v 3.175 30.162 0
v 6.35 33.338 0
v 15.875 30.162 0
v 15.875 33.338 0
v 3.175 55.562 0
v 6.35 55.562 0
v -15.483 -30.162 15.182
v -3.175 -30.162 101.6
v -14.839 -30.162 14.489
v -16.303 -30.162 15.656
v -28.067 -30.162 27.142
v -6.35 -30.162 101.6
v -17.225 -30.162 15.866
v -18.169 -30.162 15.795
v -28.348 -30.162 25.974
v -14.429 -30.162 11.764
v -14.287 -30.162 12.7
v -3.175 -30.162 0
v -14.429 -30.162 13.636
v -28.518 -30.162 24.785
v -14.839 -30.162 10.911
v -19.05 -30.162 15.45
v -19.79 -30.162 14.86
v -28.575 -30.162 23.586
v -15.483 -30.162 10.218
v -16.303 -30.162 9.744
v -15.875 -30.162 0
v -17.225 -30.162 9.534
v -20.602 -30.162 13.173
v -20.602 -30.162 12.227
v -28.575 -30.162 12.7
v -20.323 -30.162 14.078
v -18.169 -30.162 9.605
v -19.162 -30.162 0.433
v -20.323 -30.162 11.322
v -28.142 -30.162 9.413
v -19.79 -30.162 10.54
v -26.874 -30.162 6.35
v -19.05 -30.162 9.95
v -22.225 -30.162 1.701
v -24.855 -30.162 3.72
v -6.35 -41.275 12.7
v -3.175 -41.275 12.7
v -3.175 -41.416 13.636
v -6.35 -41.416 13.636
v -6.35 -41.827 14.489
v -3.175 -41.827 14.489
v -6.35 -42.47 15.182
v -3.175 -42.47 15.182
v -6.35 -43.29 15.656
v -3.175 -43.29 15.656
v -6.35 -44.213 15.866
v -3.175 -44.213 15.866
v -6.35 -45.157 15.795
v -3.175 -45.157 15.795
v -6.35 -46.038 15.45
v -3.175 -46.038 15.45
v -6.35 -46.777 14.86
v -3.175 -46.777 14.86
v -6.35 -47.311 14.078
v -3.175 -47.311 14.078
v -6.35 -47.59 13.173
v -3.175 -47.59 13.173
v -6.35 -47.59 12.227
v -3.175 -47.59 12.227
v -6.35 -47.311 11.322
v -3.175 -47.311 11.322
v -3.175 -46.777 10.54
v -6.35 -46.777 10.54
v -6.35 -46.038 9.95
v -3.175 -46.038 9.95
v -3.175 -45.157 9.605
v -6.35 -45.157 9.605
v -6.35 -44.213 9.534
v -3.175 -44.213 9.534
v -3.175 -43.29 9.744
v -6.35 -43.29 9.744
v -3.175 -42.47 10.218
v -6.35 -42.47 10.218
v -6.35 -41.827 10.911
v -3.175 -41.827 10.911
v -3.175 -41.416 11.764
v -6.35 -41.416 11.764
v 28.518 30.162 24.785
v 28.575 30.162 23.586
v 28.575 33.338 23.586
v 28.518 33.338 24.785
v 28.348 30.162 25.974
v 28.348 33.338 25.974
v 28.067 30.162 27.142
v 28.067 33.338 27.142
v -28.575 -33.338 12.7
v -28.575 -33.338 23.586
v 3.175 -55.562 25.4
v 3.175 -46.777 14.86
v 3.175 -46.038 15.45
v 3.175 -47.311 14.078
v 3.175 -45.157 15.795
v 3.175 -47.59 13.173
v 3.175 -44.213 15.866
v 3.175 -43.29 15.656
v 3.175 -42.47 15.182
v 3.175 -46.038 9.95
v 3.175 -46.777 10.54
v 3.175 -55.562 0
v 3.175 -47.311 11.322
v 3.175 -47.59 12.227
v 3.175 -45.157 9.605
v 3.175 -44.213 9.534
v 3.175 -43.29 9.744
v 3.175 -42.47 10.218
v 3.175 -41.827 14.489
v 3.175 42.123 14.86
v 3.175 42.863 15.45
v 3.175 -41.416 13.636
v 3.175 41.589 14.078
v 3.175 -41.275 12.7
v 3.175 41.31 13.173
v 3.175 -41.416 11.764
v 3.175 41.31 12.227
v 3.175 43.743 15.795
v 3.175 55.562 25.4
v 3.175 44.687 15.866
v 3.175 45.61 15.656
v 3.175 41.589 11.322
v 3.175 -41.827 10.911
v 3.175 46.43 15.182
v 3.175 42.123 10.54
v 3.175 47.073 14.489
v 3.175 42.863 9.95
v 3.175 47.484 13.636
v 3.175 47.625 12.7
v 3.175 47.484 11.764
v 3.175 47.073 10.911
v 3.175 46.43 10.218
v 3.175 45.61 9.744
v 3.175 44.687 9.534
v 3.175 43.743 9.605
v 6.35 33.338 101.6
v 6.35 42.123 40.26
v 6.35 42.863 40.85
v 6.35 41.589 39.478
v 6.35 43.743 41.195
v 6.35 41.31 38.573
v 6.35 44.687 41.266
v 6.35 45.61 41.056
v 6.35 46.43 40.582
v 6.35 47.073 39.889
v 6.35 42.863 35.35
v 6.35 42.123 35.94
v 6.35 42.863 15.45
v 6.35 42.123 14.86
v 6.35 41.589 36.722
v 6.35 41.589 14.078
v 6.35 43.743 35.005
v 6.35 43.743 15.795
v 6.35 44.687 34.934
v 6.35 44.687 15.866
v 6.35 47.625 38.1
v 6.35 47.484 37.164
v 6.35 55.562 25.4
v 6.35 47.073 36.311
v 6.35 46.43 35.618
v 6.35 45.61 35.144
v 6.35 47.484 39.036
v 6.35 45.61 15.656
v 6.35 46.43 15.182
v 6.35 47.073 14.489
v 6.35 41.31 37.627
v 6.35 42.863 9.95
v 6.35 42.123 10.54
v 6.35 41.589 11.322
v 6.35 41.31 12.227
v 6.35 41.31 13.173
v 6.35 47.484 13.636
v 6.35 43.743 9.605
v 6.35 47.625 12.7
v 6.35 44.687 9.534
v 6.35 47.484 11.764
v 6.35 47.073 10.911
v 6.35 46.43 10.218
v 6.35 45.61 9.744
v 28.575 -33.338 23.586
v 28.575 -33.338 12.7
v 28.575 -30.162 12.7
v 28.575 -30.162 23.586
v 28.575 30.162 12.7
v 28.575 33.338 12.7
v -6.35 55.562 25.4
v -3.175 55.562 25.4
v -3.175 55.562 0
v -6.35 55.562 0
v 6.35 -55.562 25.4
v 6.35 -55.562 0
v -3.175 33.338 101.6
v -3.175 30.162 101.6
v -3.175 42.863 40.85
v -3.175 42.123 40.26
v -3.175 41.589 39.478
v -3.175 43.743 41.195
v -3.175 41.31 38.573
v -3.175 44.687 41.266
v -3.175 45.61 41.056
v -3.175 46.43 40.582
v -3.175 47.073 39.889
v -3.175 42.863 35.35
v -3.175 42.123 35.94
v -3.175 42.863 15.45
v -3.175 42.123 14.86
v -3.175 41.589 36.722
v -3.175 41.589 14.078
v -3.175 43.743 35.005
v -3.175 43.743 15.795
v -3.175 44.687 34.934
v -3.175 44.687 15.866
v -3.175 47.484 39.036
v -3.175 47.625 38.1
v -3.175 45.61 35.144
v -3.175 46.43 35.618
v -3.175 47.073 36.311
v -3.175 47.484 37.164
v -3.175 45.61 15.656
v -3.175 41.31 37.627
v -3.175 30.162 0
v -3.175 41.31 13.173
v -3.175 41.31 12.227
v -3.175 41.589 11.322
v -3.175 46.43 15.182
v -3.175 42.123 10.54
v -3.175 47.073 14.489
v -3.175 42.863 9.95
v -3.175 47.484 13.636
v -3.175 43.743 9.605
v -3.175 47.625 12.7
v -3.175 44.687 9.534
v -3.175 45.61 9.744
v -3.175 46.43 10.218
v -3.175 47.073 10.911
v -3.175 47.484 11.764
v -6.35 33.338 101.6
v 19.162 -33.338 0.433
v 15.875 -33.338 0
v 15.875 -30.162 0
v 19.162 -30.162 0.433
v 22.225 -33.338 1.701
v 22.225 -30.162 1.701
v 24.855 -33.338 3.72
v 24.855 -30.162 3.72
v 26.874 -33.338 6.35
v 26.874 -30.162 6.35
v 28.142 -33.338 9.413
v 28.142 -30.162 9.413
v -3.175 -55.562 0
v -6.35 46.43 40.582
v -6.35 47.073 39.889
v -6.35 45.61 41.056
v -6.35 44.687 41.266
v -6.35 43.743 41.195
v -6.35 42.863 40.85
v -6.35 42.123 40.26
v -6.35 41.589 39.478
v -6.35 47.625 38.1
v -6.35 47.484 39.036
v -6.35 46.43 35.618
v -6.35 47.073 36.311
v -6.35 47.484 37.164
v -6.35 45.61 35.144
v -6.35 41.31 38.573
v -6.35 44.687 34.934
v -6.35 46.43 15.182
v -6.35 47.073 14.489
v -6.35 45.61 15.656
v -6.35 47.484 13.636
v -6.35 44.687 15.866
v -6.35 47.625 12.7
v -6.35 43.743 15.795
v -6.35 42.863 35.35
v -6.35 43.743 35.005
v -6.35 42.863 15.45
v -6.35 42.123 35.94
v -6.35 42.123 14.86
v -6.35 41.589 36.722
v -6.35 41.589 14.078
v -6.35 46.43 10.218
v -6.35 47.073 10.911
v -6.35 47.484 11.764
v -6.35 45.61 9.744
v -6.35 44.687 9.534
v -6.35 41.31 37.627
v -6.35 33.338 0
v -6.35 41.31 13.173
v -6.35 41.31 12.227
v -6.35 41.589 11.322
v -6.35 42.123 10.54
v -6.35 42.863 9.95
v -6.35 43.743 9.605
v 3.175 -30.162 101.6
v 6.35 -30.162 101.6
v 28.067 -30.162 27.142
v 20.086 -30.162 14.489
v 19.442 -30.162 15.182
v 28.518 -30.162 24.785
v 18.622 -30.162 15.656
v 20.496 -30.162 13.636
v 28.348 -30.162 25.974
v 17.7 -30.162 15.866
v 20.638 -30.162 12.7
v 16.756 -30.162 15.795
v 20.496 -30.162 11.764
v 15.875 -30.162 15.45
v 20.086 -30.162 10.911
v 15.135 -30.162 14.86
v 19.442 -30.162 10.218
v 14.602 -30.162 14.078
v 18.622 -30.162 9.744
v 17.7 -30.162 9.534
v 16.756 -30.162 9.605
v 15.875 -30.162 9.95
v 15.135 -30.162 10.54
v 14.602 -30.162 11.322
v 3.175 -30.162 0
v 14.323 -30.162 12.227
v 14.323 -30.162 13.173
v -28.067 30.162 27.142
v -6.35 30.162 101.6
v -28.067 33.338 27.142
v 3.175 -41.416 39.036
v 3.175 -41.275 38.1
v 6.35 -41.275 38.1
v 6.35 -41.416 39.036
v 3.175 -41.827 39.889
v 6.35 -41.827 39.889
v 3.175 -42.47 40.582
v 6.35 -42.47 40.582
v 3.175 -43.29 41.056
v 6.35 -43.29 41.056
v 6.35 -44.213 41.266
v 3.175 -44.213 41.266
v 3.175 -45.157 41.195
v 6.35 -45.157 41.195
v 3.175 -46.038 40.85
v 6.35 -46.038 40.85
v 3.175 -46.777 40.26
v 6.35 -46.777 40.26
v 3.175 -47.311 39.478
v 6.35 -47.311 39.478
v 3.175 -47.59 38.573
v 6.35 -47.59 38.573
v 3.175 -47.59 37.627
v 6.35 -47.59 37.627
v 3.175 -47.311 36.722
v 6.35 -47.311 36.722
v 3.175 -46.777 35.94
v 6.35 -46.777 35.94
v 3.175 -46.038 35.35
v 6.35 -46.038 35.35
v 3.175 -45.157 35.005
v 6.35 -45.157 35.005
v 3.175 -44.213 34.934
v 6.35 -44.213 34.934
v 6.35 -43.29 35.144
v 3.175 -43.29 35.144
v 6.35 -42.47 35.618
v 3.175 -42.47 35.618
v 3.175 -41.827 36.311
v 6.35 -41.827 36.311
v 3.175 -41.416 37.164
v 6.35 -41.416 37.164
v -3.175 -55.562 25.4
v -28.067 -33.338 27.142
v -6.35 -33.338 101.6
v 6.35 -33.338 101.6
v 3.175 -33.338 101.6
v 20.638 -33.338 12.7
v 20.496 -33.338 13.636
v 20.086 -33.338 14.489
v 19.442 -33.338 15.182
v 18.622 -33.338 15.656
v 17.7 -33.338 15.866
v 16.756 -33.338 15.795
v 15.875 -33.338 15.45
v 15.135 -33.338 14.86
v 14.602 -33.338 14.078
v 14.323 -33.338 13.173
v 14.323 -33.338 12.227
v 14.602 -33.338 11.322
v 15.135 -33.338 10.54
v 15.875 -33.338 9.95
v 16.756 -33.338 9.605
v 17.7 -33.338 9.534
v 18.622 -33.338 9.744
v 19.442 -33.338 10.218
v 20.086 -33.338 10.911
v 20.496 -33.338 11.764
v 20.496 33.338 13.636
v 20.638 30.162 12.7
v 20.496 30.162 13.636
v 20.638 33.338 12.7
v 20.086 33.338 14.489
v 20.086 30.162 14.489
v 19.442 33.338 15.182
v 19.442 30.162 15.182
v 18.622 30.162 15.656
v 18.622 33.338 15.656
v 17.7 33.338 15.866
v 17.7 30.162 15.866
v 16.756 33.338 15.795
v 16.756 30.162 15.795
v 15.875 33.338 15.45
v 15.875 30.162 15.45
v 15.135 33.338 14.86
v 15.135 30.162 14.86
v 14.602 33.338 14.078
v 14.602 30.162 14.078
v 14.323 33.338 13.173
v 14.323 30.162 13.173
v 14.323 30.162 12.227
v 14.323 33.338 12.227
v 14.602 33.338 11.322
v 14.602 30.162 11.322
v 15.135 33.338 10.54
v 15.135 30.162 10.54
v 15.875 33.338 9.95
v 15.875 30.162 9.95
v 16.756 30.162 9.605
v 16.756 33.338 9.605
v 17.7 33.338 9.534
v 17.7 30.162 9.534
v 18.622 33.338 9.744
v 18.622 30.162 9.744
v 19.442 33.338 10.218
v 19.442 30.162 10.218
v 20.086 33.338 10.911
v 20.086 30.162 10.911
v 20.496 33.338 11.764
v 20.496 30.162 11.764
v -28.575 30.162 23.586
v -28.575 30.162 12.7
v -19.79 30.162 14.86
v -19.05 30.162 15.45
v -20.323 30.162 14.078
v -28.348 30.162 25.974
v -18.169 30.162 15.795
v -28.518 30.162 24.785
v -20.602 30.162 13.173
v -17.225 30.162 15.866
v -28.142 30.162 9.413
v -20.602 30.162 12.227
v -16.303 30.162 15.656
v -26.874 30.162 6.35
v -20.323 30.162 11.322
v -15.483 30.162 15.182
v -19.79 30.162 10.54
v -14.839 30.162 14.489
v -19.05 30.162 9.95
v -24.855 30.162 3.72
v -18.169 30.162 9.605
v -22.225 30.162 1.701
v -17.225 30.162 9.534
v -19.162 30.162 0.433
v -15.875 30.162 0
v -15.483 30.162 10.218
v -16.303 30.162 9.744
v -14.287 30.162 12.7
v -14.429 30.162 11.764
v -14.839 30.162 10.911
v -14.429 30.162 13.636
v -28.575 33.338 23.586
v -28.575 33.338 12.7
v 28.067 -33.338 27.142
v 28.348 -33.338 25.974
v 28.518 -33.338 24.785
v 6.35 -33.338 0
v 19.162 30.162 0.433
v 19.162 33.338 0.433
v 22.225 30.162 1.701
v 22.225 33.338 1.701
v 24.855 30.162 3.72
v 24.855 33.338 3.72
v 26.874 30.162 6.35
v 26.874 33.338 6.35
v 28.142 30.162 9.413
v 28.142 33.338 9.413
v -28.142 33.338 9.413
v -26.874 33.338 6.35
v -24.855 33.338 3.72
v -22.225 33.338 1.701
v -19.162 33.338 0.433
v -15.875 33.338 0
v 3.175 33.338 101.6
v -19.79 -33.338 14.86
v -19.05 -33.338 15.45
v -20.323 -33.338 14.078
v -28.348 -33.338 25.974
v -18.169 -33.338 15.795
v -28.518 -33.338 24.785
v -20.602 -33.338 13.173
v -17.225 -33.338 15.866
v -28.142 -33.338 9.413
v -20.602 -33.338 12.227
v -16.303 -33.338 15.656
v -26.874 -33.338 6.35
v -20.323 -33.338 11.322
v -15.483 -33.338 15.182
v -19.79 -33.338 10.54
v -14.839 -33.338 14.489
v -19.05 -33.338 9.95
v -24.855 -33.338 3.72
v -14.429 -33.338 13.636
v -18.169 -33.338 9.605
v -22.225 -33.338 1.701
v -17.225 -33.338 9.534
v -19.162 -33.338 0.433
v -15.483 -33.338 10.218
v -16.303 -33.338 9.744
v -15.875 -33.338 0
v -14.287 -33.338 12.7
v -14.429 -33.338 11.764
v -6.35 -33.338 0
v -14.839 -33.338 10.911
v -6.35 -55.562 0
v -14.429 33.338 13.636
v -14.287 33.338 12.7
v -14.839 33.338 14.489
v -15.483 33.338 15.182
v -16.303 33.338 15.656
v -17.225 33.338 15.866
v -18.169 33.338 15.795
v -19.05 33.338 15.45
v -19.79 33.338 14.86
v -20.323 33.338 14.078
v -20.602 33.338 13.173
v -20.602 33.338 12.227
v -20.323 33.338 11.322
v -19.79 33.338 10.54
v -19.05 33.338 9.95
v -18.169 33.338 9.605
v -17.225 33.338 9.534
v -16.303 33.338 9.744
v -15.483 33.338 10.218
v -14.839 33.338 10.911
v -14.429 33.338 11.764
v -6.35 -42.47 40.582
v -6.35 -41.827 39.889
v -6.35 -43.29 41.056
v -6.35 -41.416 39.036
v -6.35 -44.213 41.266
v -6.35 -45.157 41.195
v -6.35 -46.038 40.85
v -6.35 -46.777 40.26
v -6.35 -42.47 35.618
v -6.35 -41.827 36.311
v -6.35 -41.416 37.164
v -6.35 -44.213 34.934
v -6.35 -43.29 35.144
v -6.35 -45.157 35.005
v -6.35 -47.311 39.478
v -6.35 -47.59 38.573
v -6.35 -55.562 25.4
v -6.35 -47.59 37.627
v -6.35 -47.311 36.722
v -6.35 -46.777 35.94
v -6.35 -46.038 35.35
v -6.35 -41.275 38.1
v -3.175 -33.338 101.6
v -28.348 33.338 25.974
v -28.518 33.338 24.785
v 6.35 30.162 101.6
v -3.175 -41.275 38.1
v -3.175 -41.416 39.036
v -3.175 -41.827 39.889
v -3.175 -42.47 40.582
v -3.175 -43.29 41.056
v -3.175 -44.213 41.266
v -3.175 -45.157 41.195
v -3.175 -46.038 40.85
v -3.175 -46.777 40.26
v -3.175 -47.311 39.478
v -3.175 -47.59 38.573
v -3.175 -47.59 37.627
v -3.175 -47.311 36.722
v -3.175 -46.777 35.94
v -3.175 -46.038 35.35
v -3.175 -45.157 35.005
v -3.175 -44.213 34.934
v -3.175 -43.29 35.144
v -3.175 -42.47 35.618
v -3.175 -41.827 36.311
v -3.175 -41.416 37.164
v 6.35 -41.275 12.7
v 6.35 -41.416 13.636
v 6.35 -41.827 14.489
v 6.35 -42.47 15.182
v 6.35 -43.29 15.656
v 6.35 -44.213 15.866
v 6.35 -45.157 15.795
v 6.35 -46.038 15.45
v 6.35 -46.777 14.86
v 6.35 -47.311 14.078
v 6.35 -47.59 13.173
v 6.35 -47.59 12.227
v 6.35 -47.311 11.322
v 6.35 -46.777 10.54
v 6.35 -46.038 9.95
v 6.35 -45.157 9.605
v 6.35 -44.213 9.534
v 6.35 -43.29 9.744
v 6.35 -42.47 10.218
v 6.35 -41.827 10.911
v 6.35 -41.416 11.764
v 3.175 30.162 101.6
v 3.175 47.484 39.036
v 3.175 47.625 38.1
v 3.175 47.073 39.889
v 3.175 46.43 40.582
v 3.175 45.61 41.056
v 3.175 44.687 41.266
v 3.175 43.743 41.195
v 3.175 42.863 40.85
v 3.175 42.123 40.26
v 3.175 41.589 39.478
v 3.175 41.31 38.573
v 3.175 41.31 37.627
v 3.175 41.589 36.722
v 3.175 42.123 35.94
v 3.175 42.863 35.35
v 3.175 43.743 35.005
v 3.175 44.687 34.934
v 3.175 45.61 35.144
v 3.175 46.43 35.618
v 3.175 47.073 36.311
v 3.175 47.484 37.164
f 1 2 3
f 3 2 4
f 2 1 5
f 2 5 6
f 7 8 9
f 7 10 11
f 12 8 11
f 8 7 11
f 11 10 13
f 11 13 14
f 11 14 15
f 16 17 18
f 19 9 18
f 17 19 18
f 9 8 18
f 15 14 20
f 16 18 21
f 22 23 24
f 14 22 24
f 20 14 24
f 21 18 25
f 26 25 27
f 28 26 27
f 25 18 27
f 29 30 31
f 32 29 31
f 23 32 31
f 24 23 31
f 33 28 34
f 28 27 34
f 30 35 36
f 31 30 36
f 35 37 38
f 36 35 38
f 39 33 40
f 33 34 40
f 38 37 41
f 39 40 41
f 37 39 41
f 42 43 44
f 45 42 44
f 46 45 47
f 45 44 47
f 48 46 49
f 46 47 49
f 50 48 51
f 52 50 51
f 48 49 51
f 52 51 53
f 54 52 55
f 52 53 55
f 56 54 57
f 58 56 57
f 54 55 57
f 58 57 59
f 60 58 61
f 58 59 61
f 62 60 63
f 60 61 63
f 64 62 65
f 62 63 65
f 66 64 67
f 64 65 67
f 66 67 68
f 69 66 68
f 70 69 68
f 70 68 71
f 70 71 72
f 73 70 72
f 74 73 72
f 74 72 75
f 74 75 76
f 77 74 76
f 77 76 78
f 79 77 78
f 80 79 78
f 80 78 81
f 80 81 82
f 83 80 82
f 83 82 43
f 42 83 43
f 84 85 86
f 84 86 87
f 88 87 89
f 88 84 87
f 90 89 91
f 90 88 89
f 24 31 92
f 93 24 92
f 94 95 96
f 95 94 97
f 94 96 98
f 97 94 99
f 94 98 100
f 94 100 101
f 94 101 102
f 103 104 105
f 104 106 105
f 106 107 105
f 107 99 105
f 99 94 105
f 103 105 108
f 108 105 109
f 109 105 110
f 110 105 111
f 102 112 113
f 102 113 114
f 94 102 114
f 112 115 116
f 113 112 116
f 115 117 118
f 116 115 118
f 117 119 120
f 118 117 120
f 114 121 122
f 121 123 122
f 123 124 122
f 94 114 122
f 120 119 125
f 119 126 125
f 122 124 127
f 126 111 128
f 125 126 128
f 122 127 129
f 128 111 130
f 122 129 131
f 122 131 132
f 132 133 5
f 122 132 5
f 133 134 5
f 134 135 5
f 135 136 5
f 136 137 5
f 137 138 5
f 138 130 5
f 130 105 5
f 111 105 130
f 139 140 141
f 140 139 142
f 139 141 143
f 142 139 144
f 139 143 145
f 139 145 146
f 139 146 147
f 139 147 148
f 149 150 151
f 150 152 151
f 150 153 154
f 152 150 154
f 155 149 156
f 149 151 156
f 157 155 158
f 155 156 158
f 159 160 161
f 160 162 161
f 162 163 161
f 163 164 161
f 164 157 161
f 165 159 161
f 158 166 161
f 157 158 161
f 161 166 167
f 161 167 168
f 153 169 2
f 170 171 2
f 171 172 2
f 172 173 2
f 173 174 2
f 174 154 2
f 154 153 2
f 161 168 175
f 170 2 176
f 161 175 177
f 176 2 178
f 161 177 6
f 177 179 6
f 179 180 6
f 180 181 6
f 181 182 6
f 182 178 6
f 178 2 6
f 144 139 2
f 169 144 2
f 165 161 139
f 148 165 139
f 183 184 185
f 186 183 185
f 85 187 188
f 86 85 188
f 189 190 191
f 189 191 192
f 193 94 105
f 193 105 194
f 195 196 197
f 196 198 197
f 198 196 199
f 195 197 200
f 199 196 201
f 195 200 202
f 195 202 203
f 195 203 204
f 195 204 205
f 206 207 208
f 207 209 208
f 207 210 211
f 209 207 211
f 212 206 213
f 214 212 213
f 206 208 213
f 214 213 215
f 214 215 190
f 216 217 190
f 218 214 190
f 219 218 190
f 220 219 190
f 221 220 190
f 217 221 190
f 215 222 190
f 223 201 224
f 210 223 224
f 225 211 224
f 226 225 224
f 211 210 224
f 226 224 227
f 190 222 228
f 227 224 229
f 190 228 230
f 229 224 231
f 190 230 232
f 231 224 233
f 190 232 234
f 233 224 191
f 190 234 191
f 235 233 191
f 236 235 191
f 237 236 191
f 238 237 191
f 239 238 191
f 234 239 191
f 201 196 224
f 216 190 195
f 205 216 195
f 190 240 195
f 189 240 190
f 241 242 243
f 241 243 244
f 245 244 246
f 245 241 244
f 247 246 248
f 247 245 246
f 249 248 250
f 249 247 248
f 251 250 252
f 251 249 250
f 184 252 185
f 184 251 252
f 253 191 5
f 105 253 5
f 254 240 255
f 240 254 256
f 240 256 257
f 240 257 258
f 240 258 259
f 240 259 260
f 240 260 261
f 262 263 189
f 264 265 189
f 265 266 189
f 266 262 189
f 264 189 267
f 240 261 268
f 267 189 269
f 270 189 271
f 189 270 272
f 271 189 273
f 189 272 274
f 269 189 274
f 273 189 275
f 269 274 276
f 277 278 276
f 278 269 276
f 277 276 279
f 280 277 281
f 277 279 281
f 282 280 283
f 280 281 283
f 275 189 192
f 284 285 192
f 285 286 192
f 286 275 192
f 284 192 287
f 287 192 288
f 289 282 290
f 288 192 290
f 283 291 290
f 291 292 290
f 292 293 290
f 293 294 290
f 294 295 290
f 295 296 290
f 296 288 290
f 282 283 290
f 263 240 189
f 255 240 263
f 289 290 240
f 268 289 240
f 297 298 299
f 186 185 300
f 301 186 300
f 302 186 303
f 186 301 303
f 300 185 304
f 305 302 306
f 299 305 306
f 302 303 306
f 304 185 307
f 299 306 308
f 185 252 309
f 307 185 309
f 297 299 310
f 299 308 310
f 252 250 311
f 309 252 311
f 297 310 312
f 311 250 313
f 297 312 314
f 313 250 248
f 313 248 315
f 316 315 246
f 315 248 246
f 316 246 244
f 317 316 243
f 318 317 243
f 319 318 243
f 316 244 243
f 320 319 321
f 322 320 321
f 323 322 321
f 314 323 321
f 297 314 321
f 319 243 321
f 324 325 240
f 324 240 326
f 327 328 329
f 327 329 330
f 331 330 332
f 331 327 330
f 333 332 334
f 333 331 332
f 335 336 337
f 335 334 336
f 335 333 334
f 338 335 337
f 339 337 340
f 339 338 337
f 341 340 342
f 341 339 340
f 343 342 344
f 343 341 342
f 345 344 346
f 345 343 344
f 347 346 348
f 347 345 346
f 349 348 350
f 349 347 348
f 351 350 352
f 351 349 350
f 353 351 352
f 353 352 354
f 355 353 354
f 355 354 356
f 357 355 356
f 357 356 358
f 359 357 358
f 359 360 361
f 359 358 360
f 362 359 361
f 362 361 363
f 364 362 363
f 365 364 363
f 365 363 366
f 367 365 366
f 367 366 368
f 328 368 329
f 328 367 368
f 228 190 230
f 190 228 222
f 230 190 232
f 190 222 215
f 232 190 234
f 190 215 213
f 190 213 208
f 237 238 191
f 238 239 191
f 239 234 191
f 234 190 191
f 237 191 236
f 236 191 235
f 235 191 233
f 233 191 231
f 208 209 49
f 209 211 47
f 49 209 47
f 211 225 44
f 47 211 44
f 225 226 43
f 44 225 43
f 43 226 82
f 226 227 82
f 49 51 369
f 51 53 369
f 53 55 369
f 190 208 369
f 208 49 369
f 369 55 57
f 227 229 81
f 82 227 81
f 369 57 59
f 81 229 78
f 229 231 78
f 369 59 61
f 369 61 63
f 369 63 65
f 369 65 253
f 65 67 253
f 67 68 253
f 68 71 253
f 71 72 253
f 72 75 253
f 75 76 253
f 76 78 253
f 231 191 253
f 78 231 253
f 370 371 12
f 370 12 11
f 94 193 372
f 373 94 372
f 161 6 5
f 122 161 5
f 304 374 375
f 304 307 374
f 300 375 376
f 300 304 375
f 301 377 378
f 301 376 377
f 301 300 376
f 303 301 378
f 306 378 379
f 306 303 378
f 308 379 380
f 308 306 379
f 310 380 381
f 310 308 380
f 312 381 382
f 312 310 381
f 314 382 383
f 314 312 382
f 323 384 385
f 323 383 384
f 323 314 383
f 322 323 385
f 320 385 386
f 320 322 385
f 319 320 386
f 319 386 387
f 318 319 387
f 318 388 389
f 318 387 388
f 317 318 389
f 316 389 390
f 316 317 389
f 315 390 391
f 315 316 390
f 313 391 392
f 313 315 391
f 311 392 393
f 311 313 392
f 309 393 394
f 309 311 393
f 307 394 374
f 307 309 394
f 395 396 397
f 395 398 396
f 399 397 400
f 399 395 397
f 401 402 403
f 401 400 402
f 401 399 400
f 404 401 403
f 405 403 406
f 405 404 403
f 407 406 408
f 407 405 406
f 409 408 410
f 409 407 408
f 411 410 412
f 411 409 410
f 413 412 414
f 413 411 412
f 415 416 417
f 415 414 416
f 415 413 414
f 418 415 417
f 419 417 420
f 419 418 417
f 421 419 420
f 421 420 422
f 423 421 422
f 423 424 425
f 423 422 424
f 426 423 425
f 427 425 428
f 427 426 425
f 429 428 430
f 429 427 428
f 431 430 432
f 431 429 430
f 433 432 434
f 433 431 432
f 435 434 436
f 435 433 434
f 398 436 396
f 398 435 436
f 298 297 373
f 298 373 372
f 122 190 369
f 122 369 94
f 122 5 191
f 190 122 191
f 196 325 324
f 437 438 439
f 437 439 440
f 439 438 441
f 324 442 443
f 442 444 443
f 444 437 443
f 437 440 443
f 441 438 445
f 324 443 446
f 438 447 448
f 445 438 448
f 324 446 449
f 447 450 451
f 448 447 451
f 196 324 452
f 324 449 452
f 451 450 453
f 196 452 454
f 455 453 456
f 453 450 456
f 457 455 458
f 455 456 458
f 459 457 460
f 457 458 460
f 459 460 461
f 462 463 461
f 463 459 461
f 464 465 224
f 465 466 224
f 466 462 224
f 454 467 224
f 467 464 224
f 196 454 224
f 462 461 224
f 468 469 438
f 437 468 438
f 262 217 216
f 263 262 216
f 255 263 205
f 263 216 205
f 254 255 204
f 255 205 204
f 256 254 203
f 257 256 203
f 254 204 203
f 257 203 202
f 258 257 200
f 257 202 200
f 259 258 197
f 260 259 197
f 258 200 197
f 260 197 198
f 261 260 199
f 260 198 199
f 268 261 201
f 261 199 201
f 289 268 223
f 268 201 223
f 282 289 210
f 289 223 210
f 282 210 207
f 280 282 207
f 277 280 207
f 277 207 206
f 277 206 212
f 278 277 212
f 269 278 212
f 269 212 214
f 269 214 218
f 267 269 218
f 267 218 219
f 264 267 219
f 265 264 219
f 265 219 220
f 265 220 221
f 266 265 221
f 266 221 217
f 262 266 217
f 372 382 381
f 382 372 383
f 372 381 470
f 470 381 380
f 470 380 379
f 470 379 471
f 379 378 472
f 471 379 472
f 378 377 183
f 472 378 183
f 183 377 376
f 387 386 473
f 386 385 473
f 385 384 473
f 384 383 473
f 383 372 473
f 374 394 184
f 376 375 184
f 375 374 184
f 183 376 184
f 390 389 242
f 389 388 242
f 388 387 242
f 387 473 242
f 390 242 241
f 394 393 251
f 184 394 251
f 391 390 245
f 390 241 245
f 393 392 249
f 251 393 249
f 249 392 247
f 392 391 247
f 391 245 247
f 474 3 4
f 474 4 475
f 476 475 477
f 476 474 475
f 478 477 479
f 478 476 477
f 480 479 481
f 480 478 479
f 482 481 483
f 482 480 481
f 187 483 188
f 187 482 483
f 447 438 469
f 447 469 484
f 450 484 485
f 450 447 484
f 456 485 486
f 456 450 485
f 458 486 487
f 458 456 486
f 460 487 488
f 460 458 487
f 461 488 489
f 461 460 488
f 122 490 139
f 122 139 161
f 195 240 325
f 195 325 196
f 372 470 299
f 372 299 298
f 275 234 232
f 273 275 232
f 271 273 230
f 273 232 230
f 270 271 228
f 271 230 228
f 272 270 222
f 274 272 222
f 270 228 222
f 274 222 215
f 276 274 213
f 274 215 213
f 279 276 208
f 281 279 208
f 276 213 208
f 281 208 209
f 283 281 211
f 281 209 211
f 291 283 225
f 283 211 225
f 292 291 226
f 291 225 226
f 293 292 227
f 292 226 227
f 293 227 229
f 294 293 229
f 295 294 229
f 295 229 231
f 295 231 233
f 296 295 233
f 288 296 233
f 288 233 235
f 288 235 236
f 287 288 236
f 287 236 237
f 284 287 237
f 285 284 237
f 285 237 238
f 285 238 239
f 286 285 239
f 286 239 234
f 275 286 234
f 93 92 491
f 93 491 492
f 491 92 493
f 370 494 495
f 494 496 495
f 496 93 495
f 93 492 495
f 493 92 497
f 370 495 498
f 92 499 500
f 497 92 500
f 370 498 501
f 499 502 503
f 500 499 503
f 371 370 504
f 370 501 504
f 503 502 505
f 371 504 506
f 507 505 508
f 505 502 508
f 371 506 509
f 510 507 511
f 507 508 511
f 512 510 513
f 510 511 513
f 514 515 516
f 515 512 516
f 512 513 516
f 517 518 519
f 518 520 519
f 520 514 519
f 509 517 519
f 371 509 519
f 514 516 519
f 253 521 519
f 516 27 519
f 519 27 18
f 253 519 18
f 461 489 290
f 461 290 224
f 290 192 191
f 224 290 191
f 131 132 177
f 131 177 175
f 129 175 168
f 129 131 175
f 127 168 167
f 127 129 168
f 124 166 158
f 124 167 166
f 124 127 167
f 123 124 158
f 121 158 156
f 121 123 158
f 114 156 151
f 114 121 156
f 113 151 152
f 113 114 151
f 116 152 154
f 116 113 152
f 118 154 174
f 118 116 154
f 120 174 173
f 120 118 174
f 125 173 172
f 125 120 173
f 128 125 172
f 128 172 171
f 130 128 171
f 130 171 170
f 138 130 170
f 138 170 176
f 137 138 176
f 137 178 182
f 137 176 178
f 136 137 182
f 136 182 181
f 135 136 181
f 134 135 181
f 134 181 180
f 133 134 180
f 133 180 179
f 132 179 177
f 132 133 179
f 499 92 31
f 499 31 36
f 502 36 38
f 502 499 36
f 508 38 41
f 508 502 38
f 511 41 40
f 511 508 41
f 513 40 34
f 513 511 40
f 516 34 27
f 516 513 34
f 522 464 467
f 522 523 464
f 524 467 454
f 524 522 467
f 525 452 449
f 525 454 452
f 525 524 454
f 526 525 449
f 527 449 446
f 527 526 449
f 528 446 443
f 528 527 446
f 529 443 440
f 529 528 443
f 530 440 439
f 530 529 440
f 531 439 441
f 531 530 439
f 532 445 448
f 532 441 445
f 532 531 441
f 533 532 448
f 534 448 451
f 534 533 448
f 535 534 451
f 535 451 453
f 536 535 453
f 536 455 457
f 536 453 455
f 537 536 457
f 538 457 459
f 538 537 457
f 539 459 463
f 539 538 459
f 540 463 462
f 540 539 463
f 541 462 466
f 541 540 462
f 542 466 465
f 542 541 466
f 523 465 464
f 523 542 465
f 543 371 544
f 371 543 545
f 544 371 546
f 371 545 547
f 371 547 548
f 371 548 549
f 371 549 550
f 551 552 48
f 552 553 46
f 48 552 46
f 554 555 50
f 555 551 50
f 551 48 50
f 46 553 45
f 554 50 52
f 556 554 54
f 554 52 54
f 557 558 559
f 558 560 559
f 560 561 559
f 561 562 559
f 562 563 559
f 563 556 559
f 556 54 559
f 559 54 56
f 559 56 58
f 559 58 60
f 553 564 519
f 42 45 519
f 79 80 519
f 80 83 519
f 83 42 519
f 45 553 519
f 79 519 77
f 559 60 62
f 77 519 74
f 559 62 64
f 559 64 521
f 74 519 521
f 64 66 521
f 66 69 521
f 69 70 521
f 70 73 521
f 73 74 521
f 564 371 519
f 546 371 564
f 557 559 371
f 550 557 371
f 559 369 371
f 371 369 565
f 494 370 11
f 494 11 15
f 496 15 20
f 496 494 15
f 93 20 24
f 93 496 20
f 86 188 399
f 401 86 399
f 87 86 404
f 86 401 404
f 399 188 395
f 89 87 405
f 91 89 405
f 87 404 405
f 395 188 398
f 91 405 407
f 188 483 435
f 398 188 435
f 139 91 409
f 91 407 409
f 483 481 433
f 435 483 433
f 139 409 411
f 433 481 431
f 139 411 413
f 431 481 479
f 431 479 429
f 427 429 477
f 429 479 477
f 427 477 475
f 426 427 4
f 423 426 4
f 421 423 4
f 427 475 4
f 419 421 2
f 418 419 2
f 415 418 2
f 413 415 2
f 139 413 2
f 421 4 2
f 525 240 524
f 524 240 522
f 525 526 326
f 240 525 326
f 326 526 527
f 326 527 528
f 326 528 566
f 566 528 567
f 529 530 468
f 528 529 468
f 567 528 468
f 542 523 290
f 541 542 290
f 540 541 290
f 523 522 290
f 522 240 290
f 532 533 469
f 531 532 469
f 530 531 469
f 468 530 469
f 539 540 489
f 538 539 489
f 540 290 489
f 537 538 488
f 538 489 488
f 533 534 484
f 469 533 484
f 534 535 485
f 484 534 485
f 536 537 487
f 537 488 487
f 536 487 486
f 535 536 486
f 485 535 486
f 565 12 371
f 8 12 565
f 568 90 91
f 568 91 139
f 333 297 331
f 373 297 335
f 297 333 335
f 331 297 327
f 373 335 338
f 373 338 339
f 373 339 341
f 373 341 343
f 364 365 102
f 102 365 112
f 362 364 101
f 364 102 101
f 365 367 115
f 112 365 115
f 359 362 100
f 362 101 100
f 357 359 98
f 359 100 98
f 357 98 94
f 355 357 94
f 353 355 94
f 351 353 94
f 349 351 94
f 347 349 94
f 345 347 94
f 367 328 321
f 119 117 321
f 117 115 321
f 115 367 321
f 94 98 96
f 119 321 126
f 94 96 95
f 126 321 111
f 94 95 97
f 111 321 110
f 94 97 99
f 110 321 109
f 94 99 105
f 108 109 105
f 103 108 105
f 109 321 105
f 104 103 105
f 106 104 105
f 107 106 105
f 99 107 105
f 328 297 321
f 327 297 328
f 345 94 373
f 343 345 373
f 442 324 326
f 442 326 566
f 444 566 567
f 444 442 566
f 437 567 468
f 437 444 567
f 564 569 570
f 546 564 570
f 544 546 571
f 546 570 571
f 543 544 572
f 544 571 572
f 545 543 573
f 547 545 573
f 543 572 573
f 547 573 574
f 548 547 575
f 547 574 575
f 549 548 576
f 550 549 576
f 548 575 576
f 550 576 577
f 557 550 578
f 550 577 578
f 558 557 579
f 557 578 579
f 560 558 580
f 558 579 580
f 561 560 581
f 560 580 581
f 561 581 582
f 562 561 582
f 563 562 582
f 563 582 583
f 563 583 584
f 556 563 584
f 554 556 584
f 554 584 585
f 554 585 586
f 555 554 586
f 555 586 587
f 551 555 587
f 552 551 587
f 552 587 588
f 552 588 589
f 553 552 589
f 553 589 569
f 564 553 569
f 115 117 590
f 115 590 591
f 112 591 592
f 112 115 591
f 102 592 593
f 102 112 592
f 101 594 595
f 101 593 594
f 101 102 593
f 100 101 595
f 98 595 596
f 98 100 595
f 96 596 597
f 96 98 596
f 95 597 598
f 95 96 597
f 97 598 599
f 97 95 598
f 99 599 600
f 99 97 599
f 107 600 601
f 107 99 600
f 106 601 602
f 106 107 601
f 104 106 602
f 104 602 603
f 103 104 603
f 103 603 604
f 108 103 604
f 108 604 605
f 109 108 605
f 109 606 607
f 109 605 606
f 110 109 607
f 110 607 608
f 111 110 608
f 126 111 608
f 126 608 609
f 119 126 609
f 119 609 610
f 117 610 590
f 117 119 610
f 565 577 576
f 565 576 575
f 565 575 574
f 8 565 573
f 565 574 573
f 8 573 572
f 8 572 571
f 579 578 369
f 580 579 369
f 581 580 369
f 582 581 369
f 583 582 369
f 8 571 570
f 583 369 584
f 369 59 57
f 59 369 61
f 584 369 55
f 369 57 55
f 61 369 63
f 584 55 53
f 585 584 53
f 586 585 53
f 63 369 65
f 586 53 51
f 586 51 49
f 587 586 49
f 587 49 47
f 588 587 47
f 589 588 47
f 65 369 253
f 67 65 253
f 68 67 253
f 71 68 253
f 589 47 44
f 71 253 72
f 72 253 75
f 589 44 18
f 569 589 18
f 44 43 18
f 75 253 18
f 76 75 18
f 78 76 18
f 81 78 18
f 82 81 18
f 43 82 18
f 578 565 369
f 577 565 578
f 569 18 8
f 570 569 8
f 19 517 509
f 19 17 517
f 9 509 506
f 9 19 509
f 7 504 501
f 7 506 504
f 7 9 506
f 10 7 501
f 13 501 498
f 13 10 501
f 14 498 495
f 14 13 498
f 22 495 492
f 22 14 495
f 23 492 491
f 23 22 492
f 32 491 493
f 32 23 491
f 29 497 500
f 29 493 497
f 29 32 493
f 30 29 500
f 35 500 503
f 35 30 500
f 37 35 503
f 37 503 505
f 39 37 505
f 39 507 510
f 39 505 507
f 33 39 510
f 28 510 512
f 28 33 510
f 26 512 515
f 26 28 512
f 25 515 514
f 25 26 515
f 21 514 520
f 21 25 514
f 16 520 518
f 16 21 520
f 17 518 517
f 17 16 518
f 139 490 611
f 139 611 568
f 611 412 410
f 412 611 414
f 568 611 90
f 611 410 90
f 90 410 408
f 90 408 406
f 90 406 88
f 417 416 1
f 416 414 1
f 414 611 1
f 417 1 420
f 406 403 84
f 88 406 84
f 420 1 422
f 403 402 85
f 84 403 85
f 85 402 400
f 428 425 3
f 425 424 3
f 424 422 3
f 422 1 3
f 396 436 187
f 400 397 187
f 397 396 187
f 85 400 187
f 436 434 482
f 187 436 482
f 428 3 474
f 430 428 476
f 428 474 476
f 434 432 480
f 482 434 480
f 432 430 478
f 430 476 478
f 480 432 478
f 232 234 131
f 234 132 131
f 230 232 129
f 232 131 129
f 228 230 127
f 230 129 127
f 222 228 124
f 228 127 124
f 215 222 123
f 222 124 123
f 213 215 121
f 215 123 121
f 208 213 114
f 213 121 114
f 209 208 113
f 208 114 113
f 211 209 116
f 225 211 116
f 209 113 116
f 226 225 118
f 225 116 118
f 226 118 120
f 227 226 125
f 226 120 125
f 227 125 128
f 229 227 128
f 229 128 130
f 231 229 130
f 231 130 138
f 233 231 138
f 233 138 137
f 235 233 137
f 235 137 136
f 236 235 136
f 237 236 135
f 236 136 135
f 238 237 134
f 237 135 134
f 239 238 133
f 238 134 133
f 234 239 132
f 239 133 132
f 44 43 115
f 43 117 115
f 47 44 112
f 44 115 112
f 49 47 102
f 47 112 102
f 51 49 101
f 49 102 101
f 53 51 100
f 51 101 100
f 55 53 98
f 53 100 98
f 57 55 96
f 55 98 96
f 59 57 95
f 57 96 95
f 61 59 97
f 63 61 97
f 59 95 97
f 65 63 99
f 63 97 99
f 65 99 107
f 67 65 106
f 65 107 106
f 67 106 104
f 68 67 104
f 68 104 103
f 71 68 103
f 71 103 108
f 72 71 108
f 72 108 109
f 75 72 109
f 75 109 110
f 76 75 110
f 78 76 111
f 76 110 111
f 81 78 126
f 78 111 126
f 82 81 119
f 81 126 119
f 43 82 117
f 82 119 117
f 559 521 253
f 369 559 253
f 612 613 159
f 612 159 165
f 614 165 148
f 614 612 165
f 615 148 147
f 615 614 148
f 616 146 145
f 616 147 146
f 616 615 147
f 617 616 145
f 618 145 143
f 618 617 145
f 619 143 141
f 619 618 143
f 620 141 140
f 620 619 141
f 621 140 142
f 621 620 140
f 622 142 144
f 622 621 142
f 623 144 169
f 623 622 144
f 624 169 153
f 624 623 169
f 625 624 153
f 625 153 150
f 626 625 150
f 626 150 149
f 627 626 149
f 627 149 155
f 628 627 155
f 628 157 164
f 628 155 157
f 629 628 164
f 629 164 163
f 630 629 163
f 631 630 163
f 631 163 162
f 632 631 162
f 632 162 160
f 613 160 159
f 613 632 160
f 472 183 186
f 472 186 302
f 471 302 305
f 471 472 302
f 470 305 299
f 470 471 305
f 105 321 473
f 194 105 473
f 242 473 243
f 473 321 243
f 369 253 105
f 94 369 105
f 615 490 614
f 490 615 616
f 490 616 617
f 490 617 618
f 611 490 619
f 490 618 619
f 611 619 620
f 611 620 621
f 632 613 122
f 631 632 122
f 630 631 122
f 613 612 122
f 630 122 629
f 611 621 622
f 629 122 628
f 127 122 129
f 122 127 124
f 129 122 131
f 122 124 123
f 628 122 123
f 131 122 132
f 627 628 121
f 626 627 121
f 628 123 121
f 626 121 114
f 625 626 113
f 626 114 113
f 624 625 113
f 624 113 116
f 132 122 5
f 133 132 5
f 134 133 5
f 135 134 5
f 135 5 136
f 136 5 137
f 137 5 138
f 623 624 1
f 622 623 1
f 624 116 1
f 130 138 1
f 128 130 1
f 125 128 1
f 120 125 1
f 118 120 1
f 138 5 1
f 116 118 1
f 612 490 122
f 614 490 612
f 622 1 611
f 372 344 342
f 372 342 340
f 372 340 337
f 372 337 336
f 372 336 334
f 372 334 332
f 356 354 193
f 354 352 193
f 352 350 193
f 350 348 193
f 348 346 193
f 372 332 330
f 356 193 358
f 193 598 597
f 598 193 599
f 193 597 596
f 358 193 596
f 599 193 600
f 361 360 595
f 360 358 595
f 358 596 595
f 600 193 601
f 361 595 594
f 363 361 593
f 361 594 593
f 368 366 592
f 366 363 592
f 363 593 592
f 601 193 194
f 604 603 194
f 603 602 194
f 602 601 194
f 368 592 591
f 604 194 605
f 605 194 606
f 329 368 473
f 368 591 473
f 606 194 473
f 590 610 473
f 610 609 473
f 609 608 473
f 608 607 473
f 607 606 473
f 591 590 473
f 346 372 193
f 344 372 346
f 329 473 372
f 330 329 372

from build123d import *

# Parameters (mm, degrees)
F1_DEPTH = 101.6
F2_R     = 3.175
F3_DEPTH = 101.6
F4_DEPTH = 25.4
F5_R     = 3.175
F6_DEPTH = 50.8


with BuildPart() as f1:
    # F0 (on Top) → F1 (new body)
    with BuildSketch(Plane.XY):
        Polygon((-28.575, 33.3375), (-28.575, 30.1625), (-3.175, 30.1625), (-3.175, 55.5625), (-6.35, 55.5625), (-6.35, 33.3375), align=None)
        Polygon((6.35, 55.5625), (3.175, 55.5625), (3.175, 30.1625), (28.575, 30.1625), (28.575, 33.3375), (6.35, 33.3375), align=None)
        Polygon((3.175, -30.1625), (3.175, -55.5625), (6.35, -55.5625), (6.35, -33.3375), (28.575, -33.3375), (28.575, -30.1625), align=None)
        Polygon((-3.175, -55.5625), (-3.175, -30.1625), (-28.575, -30.1625), (-28.575, -33.3375), (-6.35, -33.3375), (-6.35, -55.5625), align=None)
    extrude(amount=F1_DEPTH)

    # F2 (on Front) → F3 (intersect, symmetric)
    with BuildSketch(Plane.XZ):
        with BuildLine():
            ThreePointArc((28.575, 23.585714), (28.447359, 25.381766), (28.067, 27.141714))
            Line((28.067, 27.141714), (6.35, 101.6))
            Line((6.35, 101.6), (-6.35, 101.6))
            Line((-6.35, 101.6), (-28.067, 27.141714))
            ThreePointArc((-28.067, 27.141714), (-28.447359, 25.381766), (-28.575, 23.585714))
            Line((-28.575, 23.585714), (-28.575, 12.7))
            ThreePointArc((-28.575, 12.7), (-24.855256, 3.719744), (-15.875, 0))
            Line((-15.875, 0), (15.875, 0))
            ThreePointArc((15.875, 0), (24.855256, 3.719744), (28.575, 12.7))
            Line((28.575, 12.7), (28.575, 23.585714))
        make_face()
        with Locations((-17.4625, 12.7)):
            Circle(F2_R, mode=Mode.SUBTRACT)
        with Locations((17.4625, 12.7)):
            Circle(F2_R, mode=Mode.SUBTRACT)
    extrude(amount=F3_DEPTH, both=True, mode=Mode.INTERSECT)


with BuildPart() as f4:
    # F0 (on Top) → F4 (new body)
    with BuildSketch(Plane.XY):
        Polygon((-3.175, 55.5625), (-3.175, 30.1625), (-3.175, -30.1625), (-3.175, -55.5625), (3.175, -55.5625), (3.175, -30.1625), (3.175, 30.1625), (3.175, 55.5625), align=None)
    extrude(amount=F4_DEPTH)


with BuildPart() as f6_tool:
    # F5 (on Right) → F6 (new body, symmetric)
    with BuildSketch(Plane.YZ):
        with Locations((-44.45, 12.7)):
            Circle(F5_R)
        with Locations((-44.45, 38.1)):
            Circle(F5_R)
        with Locations((44.45, 38.1)):
            Circle(F5_R)
        with Locations((44.45, 12.7)):
            Circle(F5_R)
        Polygon((33.3375, 101.6), (55.5625, 25.4), (55.5625, 101.6), align=None)
        Polygon((-55.5625, 101.6), (-55.5625, 25.4), (-33.3375, 101.6), align=None)
    extrude(amount=F6_DEPTH, both=True)


with BuildPart() as f1_1:
    add(f1.part)

    # F6: cut by f6_tool
    add(f6_tool.part, mode=Mode.SUBTRACT)


with BuildPart() as f4_1:
    add(f4.part)

    # F6: cut by f6_tool
    add(f6_tool.part, mode=Mode.SUBTRACT)


solid = Compound([f1_1.part, f4_1.part])
